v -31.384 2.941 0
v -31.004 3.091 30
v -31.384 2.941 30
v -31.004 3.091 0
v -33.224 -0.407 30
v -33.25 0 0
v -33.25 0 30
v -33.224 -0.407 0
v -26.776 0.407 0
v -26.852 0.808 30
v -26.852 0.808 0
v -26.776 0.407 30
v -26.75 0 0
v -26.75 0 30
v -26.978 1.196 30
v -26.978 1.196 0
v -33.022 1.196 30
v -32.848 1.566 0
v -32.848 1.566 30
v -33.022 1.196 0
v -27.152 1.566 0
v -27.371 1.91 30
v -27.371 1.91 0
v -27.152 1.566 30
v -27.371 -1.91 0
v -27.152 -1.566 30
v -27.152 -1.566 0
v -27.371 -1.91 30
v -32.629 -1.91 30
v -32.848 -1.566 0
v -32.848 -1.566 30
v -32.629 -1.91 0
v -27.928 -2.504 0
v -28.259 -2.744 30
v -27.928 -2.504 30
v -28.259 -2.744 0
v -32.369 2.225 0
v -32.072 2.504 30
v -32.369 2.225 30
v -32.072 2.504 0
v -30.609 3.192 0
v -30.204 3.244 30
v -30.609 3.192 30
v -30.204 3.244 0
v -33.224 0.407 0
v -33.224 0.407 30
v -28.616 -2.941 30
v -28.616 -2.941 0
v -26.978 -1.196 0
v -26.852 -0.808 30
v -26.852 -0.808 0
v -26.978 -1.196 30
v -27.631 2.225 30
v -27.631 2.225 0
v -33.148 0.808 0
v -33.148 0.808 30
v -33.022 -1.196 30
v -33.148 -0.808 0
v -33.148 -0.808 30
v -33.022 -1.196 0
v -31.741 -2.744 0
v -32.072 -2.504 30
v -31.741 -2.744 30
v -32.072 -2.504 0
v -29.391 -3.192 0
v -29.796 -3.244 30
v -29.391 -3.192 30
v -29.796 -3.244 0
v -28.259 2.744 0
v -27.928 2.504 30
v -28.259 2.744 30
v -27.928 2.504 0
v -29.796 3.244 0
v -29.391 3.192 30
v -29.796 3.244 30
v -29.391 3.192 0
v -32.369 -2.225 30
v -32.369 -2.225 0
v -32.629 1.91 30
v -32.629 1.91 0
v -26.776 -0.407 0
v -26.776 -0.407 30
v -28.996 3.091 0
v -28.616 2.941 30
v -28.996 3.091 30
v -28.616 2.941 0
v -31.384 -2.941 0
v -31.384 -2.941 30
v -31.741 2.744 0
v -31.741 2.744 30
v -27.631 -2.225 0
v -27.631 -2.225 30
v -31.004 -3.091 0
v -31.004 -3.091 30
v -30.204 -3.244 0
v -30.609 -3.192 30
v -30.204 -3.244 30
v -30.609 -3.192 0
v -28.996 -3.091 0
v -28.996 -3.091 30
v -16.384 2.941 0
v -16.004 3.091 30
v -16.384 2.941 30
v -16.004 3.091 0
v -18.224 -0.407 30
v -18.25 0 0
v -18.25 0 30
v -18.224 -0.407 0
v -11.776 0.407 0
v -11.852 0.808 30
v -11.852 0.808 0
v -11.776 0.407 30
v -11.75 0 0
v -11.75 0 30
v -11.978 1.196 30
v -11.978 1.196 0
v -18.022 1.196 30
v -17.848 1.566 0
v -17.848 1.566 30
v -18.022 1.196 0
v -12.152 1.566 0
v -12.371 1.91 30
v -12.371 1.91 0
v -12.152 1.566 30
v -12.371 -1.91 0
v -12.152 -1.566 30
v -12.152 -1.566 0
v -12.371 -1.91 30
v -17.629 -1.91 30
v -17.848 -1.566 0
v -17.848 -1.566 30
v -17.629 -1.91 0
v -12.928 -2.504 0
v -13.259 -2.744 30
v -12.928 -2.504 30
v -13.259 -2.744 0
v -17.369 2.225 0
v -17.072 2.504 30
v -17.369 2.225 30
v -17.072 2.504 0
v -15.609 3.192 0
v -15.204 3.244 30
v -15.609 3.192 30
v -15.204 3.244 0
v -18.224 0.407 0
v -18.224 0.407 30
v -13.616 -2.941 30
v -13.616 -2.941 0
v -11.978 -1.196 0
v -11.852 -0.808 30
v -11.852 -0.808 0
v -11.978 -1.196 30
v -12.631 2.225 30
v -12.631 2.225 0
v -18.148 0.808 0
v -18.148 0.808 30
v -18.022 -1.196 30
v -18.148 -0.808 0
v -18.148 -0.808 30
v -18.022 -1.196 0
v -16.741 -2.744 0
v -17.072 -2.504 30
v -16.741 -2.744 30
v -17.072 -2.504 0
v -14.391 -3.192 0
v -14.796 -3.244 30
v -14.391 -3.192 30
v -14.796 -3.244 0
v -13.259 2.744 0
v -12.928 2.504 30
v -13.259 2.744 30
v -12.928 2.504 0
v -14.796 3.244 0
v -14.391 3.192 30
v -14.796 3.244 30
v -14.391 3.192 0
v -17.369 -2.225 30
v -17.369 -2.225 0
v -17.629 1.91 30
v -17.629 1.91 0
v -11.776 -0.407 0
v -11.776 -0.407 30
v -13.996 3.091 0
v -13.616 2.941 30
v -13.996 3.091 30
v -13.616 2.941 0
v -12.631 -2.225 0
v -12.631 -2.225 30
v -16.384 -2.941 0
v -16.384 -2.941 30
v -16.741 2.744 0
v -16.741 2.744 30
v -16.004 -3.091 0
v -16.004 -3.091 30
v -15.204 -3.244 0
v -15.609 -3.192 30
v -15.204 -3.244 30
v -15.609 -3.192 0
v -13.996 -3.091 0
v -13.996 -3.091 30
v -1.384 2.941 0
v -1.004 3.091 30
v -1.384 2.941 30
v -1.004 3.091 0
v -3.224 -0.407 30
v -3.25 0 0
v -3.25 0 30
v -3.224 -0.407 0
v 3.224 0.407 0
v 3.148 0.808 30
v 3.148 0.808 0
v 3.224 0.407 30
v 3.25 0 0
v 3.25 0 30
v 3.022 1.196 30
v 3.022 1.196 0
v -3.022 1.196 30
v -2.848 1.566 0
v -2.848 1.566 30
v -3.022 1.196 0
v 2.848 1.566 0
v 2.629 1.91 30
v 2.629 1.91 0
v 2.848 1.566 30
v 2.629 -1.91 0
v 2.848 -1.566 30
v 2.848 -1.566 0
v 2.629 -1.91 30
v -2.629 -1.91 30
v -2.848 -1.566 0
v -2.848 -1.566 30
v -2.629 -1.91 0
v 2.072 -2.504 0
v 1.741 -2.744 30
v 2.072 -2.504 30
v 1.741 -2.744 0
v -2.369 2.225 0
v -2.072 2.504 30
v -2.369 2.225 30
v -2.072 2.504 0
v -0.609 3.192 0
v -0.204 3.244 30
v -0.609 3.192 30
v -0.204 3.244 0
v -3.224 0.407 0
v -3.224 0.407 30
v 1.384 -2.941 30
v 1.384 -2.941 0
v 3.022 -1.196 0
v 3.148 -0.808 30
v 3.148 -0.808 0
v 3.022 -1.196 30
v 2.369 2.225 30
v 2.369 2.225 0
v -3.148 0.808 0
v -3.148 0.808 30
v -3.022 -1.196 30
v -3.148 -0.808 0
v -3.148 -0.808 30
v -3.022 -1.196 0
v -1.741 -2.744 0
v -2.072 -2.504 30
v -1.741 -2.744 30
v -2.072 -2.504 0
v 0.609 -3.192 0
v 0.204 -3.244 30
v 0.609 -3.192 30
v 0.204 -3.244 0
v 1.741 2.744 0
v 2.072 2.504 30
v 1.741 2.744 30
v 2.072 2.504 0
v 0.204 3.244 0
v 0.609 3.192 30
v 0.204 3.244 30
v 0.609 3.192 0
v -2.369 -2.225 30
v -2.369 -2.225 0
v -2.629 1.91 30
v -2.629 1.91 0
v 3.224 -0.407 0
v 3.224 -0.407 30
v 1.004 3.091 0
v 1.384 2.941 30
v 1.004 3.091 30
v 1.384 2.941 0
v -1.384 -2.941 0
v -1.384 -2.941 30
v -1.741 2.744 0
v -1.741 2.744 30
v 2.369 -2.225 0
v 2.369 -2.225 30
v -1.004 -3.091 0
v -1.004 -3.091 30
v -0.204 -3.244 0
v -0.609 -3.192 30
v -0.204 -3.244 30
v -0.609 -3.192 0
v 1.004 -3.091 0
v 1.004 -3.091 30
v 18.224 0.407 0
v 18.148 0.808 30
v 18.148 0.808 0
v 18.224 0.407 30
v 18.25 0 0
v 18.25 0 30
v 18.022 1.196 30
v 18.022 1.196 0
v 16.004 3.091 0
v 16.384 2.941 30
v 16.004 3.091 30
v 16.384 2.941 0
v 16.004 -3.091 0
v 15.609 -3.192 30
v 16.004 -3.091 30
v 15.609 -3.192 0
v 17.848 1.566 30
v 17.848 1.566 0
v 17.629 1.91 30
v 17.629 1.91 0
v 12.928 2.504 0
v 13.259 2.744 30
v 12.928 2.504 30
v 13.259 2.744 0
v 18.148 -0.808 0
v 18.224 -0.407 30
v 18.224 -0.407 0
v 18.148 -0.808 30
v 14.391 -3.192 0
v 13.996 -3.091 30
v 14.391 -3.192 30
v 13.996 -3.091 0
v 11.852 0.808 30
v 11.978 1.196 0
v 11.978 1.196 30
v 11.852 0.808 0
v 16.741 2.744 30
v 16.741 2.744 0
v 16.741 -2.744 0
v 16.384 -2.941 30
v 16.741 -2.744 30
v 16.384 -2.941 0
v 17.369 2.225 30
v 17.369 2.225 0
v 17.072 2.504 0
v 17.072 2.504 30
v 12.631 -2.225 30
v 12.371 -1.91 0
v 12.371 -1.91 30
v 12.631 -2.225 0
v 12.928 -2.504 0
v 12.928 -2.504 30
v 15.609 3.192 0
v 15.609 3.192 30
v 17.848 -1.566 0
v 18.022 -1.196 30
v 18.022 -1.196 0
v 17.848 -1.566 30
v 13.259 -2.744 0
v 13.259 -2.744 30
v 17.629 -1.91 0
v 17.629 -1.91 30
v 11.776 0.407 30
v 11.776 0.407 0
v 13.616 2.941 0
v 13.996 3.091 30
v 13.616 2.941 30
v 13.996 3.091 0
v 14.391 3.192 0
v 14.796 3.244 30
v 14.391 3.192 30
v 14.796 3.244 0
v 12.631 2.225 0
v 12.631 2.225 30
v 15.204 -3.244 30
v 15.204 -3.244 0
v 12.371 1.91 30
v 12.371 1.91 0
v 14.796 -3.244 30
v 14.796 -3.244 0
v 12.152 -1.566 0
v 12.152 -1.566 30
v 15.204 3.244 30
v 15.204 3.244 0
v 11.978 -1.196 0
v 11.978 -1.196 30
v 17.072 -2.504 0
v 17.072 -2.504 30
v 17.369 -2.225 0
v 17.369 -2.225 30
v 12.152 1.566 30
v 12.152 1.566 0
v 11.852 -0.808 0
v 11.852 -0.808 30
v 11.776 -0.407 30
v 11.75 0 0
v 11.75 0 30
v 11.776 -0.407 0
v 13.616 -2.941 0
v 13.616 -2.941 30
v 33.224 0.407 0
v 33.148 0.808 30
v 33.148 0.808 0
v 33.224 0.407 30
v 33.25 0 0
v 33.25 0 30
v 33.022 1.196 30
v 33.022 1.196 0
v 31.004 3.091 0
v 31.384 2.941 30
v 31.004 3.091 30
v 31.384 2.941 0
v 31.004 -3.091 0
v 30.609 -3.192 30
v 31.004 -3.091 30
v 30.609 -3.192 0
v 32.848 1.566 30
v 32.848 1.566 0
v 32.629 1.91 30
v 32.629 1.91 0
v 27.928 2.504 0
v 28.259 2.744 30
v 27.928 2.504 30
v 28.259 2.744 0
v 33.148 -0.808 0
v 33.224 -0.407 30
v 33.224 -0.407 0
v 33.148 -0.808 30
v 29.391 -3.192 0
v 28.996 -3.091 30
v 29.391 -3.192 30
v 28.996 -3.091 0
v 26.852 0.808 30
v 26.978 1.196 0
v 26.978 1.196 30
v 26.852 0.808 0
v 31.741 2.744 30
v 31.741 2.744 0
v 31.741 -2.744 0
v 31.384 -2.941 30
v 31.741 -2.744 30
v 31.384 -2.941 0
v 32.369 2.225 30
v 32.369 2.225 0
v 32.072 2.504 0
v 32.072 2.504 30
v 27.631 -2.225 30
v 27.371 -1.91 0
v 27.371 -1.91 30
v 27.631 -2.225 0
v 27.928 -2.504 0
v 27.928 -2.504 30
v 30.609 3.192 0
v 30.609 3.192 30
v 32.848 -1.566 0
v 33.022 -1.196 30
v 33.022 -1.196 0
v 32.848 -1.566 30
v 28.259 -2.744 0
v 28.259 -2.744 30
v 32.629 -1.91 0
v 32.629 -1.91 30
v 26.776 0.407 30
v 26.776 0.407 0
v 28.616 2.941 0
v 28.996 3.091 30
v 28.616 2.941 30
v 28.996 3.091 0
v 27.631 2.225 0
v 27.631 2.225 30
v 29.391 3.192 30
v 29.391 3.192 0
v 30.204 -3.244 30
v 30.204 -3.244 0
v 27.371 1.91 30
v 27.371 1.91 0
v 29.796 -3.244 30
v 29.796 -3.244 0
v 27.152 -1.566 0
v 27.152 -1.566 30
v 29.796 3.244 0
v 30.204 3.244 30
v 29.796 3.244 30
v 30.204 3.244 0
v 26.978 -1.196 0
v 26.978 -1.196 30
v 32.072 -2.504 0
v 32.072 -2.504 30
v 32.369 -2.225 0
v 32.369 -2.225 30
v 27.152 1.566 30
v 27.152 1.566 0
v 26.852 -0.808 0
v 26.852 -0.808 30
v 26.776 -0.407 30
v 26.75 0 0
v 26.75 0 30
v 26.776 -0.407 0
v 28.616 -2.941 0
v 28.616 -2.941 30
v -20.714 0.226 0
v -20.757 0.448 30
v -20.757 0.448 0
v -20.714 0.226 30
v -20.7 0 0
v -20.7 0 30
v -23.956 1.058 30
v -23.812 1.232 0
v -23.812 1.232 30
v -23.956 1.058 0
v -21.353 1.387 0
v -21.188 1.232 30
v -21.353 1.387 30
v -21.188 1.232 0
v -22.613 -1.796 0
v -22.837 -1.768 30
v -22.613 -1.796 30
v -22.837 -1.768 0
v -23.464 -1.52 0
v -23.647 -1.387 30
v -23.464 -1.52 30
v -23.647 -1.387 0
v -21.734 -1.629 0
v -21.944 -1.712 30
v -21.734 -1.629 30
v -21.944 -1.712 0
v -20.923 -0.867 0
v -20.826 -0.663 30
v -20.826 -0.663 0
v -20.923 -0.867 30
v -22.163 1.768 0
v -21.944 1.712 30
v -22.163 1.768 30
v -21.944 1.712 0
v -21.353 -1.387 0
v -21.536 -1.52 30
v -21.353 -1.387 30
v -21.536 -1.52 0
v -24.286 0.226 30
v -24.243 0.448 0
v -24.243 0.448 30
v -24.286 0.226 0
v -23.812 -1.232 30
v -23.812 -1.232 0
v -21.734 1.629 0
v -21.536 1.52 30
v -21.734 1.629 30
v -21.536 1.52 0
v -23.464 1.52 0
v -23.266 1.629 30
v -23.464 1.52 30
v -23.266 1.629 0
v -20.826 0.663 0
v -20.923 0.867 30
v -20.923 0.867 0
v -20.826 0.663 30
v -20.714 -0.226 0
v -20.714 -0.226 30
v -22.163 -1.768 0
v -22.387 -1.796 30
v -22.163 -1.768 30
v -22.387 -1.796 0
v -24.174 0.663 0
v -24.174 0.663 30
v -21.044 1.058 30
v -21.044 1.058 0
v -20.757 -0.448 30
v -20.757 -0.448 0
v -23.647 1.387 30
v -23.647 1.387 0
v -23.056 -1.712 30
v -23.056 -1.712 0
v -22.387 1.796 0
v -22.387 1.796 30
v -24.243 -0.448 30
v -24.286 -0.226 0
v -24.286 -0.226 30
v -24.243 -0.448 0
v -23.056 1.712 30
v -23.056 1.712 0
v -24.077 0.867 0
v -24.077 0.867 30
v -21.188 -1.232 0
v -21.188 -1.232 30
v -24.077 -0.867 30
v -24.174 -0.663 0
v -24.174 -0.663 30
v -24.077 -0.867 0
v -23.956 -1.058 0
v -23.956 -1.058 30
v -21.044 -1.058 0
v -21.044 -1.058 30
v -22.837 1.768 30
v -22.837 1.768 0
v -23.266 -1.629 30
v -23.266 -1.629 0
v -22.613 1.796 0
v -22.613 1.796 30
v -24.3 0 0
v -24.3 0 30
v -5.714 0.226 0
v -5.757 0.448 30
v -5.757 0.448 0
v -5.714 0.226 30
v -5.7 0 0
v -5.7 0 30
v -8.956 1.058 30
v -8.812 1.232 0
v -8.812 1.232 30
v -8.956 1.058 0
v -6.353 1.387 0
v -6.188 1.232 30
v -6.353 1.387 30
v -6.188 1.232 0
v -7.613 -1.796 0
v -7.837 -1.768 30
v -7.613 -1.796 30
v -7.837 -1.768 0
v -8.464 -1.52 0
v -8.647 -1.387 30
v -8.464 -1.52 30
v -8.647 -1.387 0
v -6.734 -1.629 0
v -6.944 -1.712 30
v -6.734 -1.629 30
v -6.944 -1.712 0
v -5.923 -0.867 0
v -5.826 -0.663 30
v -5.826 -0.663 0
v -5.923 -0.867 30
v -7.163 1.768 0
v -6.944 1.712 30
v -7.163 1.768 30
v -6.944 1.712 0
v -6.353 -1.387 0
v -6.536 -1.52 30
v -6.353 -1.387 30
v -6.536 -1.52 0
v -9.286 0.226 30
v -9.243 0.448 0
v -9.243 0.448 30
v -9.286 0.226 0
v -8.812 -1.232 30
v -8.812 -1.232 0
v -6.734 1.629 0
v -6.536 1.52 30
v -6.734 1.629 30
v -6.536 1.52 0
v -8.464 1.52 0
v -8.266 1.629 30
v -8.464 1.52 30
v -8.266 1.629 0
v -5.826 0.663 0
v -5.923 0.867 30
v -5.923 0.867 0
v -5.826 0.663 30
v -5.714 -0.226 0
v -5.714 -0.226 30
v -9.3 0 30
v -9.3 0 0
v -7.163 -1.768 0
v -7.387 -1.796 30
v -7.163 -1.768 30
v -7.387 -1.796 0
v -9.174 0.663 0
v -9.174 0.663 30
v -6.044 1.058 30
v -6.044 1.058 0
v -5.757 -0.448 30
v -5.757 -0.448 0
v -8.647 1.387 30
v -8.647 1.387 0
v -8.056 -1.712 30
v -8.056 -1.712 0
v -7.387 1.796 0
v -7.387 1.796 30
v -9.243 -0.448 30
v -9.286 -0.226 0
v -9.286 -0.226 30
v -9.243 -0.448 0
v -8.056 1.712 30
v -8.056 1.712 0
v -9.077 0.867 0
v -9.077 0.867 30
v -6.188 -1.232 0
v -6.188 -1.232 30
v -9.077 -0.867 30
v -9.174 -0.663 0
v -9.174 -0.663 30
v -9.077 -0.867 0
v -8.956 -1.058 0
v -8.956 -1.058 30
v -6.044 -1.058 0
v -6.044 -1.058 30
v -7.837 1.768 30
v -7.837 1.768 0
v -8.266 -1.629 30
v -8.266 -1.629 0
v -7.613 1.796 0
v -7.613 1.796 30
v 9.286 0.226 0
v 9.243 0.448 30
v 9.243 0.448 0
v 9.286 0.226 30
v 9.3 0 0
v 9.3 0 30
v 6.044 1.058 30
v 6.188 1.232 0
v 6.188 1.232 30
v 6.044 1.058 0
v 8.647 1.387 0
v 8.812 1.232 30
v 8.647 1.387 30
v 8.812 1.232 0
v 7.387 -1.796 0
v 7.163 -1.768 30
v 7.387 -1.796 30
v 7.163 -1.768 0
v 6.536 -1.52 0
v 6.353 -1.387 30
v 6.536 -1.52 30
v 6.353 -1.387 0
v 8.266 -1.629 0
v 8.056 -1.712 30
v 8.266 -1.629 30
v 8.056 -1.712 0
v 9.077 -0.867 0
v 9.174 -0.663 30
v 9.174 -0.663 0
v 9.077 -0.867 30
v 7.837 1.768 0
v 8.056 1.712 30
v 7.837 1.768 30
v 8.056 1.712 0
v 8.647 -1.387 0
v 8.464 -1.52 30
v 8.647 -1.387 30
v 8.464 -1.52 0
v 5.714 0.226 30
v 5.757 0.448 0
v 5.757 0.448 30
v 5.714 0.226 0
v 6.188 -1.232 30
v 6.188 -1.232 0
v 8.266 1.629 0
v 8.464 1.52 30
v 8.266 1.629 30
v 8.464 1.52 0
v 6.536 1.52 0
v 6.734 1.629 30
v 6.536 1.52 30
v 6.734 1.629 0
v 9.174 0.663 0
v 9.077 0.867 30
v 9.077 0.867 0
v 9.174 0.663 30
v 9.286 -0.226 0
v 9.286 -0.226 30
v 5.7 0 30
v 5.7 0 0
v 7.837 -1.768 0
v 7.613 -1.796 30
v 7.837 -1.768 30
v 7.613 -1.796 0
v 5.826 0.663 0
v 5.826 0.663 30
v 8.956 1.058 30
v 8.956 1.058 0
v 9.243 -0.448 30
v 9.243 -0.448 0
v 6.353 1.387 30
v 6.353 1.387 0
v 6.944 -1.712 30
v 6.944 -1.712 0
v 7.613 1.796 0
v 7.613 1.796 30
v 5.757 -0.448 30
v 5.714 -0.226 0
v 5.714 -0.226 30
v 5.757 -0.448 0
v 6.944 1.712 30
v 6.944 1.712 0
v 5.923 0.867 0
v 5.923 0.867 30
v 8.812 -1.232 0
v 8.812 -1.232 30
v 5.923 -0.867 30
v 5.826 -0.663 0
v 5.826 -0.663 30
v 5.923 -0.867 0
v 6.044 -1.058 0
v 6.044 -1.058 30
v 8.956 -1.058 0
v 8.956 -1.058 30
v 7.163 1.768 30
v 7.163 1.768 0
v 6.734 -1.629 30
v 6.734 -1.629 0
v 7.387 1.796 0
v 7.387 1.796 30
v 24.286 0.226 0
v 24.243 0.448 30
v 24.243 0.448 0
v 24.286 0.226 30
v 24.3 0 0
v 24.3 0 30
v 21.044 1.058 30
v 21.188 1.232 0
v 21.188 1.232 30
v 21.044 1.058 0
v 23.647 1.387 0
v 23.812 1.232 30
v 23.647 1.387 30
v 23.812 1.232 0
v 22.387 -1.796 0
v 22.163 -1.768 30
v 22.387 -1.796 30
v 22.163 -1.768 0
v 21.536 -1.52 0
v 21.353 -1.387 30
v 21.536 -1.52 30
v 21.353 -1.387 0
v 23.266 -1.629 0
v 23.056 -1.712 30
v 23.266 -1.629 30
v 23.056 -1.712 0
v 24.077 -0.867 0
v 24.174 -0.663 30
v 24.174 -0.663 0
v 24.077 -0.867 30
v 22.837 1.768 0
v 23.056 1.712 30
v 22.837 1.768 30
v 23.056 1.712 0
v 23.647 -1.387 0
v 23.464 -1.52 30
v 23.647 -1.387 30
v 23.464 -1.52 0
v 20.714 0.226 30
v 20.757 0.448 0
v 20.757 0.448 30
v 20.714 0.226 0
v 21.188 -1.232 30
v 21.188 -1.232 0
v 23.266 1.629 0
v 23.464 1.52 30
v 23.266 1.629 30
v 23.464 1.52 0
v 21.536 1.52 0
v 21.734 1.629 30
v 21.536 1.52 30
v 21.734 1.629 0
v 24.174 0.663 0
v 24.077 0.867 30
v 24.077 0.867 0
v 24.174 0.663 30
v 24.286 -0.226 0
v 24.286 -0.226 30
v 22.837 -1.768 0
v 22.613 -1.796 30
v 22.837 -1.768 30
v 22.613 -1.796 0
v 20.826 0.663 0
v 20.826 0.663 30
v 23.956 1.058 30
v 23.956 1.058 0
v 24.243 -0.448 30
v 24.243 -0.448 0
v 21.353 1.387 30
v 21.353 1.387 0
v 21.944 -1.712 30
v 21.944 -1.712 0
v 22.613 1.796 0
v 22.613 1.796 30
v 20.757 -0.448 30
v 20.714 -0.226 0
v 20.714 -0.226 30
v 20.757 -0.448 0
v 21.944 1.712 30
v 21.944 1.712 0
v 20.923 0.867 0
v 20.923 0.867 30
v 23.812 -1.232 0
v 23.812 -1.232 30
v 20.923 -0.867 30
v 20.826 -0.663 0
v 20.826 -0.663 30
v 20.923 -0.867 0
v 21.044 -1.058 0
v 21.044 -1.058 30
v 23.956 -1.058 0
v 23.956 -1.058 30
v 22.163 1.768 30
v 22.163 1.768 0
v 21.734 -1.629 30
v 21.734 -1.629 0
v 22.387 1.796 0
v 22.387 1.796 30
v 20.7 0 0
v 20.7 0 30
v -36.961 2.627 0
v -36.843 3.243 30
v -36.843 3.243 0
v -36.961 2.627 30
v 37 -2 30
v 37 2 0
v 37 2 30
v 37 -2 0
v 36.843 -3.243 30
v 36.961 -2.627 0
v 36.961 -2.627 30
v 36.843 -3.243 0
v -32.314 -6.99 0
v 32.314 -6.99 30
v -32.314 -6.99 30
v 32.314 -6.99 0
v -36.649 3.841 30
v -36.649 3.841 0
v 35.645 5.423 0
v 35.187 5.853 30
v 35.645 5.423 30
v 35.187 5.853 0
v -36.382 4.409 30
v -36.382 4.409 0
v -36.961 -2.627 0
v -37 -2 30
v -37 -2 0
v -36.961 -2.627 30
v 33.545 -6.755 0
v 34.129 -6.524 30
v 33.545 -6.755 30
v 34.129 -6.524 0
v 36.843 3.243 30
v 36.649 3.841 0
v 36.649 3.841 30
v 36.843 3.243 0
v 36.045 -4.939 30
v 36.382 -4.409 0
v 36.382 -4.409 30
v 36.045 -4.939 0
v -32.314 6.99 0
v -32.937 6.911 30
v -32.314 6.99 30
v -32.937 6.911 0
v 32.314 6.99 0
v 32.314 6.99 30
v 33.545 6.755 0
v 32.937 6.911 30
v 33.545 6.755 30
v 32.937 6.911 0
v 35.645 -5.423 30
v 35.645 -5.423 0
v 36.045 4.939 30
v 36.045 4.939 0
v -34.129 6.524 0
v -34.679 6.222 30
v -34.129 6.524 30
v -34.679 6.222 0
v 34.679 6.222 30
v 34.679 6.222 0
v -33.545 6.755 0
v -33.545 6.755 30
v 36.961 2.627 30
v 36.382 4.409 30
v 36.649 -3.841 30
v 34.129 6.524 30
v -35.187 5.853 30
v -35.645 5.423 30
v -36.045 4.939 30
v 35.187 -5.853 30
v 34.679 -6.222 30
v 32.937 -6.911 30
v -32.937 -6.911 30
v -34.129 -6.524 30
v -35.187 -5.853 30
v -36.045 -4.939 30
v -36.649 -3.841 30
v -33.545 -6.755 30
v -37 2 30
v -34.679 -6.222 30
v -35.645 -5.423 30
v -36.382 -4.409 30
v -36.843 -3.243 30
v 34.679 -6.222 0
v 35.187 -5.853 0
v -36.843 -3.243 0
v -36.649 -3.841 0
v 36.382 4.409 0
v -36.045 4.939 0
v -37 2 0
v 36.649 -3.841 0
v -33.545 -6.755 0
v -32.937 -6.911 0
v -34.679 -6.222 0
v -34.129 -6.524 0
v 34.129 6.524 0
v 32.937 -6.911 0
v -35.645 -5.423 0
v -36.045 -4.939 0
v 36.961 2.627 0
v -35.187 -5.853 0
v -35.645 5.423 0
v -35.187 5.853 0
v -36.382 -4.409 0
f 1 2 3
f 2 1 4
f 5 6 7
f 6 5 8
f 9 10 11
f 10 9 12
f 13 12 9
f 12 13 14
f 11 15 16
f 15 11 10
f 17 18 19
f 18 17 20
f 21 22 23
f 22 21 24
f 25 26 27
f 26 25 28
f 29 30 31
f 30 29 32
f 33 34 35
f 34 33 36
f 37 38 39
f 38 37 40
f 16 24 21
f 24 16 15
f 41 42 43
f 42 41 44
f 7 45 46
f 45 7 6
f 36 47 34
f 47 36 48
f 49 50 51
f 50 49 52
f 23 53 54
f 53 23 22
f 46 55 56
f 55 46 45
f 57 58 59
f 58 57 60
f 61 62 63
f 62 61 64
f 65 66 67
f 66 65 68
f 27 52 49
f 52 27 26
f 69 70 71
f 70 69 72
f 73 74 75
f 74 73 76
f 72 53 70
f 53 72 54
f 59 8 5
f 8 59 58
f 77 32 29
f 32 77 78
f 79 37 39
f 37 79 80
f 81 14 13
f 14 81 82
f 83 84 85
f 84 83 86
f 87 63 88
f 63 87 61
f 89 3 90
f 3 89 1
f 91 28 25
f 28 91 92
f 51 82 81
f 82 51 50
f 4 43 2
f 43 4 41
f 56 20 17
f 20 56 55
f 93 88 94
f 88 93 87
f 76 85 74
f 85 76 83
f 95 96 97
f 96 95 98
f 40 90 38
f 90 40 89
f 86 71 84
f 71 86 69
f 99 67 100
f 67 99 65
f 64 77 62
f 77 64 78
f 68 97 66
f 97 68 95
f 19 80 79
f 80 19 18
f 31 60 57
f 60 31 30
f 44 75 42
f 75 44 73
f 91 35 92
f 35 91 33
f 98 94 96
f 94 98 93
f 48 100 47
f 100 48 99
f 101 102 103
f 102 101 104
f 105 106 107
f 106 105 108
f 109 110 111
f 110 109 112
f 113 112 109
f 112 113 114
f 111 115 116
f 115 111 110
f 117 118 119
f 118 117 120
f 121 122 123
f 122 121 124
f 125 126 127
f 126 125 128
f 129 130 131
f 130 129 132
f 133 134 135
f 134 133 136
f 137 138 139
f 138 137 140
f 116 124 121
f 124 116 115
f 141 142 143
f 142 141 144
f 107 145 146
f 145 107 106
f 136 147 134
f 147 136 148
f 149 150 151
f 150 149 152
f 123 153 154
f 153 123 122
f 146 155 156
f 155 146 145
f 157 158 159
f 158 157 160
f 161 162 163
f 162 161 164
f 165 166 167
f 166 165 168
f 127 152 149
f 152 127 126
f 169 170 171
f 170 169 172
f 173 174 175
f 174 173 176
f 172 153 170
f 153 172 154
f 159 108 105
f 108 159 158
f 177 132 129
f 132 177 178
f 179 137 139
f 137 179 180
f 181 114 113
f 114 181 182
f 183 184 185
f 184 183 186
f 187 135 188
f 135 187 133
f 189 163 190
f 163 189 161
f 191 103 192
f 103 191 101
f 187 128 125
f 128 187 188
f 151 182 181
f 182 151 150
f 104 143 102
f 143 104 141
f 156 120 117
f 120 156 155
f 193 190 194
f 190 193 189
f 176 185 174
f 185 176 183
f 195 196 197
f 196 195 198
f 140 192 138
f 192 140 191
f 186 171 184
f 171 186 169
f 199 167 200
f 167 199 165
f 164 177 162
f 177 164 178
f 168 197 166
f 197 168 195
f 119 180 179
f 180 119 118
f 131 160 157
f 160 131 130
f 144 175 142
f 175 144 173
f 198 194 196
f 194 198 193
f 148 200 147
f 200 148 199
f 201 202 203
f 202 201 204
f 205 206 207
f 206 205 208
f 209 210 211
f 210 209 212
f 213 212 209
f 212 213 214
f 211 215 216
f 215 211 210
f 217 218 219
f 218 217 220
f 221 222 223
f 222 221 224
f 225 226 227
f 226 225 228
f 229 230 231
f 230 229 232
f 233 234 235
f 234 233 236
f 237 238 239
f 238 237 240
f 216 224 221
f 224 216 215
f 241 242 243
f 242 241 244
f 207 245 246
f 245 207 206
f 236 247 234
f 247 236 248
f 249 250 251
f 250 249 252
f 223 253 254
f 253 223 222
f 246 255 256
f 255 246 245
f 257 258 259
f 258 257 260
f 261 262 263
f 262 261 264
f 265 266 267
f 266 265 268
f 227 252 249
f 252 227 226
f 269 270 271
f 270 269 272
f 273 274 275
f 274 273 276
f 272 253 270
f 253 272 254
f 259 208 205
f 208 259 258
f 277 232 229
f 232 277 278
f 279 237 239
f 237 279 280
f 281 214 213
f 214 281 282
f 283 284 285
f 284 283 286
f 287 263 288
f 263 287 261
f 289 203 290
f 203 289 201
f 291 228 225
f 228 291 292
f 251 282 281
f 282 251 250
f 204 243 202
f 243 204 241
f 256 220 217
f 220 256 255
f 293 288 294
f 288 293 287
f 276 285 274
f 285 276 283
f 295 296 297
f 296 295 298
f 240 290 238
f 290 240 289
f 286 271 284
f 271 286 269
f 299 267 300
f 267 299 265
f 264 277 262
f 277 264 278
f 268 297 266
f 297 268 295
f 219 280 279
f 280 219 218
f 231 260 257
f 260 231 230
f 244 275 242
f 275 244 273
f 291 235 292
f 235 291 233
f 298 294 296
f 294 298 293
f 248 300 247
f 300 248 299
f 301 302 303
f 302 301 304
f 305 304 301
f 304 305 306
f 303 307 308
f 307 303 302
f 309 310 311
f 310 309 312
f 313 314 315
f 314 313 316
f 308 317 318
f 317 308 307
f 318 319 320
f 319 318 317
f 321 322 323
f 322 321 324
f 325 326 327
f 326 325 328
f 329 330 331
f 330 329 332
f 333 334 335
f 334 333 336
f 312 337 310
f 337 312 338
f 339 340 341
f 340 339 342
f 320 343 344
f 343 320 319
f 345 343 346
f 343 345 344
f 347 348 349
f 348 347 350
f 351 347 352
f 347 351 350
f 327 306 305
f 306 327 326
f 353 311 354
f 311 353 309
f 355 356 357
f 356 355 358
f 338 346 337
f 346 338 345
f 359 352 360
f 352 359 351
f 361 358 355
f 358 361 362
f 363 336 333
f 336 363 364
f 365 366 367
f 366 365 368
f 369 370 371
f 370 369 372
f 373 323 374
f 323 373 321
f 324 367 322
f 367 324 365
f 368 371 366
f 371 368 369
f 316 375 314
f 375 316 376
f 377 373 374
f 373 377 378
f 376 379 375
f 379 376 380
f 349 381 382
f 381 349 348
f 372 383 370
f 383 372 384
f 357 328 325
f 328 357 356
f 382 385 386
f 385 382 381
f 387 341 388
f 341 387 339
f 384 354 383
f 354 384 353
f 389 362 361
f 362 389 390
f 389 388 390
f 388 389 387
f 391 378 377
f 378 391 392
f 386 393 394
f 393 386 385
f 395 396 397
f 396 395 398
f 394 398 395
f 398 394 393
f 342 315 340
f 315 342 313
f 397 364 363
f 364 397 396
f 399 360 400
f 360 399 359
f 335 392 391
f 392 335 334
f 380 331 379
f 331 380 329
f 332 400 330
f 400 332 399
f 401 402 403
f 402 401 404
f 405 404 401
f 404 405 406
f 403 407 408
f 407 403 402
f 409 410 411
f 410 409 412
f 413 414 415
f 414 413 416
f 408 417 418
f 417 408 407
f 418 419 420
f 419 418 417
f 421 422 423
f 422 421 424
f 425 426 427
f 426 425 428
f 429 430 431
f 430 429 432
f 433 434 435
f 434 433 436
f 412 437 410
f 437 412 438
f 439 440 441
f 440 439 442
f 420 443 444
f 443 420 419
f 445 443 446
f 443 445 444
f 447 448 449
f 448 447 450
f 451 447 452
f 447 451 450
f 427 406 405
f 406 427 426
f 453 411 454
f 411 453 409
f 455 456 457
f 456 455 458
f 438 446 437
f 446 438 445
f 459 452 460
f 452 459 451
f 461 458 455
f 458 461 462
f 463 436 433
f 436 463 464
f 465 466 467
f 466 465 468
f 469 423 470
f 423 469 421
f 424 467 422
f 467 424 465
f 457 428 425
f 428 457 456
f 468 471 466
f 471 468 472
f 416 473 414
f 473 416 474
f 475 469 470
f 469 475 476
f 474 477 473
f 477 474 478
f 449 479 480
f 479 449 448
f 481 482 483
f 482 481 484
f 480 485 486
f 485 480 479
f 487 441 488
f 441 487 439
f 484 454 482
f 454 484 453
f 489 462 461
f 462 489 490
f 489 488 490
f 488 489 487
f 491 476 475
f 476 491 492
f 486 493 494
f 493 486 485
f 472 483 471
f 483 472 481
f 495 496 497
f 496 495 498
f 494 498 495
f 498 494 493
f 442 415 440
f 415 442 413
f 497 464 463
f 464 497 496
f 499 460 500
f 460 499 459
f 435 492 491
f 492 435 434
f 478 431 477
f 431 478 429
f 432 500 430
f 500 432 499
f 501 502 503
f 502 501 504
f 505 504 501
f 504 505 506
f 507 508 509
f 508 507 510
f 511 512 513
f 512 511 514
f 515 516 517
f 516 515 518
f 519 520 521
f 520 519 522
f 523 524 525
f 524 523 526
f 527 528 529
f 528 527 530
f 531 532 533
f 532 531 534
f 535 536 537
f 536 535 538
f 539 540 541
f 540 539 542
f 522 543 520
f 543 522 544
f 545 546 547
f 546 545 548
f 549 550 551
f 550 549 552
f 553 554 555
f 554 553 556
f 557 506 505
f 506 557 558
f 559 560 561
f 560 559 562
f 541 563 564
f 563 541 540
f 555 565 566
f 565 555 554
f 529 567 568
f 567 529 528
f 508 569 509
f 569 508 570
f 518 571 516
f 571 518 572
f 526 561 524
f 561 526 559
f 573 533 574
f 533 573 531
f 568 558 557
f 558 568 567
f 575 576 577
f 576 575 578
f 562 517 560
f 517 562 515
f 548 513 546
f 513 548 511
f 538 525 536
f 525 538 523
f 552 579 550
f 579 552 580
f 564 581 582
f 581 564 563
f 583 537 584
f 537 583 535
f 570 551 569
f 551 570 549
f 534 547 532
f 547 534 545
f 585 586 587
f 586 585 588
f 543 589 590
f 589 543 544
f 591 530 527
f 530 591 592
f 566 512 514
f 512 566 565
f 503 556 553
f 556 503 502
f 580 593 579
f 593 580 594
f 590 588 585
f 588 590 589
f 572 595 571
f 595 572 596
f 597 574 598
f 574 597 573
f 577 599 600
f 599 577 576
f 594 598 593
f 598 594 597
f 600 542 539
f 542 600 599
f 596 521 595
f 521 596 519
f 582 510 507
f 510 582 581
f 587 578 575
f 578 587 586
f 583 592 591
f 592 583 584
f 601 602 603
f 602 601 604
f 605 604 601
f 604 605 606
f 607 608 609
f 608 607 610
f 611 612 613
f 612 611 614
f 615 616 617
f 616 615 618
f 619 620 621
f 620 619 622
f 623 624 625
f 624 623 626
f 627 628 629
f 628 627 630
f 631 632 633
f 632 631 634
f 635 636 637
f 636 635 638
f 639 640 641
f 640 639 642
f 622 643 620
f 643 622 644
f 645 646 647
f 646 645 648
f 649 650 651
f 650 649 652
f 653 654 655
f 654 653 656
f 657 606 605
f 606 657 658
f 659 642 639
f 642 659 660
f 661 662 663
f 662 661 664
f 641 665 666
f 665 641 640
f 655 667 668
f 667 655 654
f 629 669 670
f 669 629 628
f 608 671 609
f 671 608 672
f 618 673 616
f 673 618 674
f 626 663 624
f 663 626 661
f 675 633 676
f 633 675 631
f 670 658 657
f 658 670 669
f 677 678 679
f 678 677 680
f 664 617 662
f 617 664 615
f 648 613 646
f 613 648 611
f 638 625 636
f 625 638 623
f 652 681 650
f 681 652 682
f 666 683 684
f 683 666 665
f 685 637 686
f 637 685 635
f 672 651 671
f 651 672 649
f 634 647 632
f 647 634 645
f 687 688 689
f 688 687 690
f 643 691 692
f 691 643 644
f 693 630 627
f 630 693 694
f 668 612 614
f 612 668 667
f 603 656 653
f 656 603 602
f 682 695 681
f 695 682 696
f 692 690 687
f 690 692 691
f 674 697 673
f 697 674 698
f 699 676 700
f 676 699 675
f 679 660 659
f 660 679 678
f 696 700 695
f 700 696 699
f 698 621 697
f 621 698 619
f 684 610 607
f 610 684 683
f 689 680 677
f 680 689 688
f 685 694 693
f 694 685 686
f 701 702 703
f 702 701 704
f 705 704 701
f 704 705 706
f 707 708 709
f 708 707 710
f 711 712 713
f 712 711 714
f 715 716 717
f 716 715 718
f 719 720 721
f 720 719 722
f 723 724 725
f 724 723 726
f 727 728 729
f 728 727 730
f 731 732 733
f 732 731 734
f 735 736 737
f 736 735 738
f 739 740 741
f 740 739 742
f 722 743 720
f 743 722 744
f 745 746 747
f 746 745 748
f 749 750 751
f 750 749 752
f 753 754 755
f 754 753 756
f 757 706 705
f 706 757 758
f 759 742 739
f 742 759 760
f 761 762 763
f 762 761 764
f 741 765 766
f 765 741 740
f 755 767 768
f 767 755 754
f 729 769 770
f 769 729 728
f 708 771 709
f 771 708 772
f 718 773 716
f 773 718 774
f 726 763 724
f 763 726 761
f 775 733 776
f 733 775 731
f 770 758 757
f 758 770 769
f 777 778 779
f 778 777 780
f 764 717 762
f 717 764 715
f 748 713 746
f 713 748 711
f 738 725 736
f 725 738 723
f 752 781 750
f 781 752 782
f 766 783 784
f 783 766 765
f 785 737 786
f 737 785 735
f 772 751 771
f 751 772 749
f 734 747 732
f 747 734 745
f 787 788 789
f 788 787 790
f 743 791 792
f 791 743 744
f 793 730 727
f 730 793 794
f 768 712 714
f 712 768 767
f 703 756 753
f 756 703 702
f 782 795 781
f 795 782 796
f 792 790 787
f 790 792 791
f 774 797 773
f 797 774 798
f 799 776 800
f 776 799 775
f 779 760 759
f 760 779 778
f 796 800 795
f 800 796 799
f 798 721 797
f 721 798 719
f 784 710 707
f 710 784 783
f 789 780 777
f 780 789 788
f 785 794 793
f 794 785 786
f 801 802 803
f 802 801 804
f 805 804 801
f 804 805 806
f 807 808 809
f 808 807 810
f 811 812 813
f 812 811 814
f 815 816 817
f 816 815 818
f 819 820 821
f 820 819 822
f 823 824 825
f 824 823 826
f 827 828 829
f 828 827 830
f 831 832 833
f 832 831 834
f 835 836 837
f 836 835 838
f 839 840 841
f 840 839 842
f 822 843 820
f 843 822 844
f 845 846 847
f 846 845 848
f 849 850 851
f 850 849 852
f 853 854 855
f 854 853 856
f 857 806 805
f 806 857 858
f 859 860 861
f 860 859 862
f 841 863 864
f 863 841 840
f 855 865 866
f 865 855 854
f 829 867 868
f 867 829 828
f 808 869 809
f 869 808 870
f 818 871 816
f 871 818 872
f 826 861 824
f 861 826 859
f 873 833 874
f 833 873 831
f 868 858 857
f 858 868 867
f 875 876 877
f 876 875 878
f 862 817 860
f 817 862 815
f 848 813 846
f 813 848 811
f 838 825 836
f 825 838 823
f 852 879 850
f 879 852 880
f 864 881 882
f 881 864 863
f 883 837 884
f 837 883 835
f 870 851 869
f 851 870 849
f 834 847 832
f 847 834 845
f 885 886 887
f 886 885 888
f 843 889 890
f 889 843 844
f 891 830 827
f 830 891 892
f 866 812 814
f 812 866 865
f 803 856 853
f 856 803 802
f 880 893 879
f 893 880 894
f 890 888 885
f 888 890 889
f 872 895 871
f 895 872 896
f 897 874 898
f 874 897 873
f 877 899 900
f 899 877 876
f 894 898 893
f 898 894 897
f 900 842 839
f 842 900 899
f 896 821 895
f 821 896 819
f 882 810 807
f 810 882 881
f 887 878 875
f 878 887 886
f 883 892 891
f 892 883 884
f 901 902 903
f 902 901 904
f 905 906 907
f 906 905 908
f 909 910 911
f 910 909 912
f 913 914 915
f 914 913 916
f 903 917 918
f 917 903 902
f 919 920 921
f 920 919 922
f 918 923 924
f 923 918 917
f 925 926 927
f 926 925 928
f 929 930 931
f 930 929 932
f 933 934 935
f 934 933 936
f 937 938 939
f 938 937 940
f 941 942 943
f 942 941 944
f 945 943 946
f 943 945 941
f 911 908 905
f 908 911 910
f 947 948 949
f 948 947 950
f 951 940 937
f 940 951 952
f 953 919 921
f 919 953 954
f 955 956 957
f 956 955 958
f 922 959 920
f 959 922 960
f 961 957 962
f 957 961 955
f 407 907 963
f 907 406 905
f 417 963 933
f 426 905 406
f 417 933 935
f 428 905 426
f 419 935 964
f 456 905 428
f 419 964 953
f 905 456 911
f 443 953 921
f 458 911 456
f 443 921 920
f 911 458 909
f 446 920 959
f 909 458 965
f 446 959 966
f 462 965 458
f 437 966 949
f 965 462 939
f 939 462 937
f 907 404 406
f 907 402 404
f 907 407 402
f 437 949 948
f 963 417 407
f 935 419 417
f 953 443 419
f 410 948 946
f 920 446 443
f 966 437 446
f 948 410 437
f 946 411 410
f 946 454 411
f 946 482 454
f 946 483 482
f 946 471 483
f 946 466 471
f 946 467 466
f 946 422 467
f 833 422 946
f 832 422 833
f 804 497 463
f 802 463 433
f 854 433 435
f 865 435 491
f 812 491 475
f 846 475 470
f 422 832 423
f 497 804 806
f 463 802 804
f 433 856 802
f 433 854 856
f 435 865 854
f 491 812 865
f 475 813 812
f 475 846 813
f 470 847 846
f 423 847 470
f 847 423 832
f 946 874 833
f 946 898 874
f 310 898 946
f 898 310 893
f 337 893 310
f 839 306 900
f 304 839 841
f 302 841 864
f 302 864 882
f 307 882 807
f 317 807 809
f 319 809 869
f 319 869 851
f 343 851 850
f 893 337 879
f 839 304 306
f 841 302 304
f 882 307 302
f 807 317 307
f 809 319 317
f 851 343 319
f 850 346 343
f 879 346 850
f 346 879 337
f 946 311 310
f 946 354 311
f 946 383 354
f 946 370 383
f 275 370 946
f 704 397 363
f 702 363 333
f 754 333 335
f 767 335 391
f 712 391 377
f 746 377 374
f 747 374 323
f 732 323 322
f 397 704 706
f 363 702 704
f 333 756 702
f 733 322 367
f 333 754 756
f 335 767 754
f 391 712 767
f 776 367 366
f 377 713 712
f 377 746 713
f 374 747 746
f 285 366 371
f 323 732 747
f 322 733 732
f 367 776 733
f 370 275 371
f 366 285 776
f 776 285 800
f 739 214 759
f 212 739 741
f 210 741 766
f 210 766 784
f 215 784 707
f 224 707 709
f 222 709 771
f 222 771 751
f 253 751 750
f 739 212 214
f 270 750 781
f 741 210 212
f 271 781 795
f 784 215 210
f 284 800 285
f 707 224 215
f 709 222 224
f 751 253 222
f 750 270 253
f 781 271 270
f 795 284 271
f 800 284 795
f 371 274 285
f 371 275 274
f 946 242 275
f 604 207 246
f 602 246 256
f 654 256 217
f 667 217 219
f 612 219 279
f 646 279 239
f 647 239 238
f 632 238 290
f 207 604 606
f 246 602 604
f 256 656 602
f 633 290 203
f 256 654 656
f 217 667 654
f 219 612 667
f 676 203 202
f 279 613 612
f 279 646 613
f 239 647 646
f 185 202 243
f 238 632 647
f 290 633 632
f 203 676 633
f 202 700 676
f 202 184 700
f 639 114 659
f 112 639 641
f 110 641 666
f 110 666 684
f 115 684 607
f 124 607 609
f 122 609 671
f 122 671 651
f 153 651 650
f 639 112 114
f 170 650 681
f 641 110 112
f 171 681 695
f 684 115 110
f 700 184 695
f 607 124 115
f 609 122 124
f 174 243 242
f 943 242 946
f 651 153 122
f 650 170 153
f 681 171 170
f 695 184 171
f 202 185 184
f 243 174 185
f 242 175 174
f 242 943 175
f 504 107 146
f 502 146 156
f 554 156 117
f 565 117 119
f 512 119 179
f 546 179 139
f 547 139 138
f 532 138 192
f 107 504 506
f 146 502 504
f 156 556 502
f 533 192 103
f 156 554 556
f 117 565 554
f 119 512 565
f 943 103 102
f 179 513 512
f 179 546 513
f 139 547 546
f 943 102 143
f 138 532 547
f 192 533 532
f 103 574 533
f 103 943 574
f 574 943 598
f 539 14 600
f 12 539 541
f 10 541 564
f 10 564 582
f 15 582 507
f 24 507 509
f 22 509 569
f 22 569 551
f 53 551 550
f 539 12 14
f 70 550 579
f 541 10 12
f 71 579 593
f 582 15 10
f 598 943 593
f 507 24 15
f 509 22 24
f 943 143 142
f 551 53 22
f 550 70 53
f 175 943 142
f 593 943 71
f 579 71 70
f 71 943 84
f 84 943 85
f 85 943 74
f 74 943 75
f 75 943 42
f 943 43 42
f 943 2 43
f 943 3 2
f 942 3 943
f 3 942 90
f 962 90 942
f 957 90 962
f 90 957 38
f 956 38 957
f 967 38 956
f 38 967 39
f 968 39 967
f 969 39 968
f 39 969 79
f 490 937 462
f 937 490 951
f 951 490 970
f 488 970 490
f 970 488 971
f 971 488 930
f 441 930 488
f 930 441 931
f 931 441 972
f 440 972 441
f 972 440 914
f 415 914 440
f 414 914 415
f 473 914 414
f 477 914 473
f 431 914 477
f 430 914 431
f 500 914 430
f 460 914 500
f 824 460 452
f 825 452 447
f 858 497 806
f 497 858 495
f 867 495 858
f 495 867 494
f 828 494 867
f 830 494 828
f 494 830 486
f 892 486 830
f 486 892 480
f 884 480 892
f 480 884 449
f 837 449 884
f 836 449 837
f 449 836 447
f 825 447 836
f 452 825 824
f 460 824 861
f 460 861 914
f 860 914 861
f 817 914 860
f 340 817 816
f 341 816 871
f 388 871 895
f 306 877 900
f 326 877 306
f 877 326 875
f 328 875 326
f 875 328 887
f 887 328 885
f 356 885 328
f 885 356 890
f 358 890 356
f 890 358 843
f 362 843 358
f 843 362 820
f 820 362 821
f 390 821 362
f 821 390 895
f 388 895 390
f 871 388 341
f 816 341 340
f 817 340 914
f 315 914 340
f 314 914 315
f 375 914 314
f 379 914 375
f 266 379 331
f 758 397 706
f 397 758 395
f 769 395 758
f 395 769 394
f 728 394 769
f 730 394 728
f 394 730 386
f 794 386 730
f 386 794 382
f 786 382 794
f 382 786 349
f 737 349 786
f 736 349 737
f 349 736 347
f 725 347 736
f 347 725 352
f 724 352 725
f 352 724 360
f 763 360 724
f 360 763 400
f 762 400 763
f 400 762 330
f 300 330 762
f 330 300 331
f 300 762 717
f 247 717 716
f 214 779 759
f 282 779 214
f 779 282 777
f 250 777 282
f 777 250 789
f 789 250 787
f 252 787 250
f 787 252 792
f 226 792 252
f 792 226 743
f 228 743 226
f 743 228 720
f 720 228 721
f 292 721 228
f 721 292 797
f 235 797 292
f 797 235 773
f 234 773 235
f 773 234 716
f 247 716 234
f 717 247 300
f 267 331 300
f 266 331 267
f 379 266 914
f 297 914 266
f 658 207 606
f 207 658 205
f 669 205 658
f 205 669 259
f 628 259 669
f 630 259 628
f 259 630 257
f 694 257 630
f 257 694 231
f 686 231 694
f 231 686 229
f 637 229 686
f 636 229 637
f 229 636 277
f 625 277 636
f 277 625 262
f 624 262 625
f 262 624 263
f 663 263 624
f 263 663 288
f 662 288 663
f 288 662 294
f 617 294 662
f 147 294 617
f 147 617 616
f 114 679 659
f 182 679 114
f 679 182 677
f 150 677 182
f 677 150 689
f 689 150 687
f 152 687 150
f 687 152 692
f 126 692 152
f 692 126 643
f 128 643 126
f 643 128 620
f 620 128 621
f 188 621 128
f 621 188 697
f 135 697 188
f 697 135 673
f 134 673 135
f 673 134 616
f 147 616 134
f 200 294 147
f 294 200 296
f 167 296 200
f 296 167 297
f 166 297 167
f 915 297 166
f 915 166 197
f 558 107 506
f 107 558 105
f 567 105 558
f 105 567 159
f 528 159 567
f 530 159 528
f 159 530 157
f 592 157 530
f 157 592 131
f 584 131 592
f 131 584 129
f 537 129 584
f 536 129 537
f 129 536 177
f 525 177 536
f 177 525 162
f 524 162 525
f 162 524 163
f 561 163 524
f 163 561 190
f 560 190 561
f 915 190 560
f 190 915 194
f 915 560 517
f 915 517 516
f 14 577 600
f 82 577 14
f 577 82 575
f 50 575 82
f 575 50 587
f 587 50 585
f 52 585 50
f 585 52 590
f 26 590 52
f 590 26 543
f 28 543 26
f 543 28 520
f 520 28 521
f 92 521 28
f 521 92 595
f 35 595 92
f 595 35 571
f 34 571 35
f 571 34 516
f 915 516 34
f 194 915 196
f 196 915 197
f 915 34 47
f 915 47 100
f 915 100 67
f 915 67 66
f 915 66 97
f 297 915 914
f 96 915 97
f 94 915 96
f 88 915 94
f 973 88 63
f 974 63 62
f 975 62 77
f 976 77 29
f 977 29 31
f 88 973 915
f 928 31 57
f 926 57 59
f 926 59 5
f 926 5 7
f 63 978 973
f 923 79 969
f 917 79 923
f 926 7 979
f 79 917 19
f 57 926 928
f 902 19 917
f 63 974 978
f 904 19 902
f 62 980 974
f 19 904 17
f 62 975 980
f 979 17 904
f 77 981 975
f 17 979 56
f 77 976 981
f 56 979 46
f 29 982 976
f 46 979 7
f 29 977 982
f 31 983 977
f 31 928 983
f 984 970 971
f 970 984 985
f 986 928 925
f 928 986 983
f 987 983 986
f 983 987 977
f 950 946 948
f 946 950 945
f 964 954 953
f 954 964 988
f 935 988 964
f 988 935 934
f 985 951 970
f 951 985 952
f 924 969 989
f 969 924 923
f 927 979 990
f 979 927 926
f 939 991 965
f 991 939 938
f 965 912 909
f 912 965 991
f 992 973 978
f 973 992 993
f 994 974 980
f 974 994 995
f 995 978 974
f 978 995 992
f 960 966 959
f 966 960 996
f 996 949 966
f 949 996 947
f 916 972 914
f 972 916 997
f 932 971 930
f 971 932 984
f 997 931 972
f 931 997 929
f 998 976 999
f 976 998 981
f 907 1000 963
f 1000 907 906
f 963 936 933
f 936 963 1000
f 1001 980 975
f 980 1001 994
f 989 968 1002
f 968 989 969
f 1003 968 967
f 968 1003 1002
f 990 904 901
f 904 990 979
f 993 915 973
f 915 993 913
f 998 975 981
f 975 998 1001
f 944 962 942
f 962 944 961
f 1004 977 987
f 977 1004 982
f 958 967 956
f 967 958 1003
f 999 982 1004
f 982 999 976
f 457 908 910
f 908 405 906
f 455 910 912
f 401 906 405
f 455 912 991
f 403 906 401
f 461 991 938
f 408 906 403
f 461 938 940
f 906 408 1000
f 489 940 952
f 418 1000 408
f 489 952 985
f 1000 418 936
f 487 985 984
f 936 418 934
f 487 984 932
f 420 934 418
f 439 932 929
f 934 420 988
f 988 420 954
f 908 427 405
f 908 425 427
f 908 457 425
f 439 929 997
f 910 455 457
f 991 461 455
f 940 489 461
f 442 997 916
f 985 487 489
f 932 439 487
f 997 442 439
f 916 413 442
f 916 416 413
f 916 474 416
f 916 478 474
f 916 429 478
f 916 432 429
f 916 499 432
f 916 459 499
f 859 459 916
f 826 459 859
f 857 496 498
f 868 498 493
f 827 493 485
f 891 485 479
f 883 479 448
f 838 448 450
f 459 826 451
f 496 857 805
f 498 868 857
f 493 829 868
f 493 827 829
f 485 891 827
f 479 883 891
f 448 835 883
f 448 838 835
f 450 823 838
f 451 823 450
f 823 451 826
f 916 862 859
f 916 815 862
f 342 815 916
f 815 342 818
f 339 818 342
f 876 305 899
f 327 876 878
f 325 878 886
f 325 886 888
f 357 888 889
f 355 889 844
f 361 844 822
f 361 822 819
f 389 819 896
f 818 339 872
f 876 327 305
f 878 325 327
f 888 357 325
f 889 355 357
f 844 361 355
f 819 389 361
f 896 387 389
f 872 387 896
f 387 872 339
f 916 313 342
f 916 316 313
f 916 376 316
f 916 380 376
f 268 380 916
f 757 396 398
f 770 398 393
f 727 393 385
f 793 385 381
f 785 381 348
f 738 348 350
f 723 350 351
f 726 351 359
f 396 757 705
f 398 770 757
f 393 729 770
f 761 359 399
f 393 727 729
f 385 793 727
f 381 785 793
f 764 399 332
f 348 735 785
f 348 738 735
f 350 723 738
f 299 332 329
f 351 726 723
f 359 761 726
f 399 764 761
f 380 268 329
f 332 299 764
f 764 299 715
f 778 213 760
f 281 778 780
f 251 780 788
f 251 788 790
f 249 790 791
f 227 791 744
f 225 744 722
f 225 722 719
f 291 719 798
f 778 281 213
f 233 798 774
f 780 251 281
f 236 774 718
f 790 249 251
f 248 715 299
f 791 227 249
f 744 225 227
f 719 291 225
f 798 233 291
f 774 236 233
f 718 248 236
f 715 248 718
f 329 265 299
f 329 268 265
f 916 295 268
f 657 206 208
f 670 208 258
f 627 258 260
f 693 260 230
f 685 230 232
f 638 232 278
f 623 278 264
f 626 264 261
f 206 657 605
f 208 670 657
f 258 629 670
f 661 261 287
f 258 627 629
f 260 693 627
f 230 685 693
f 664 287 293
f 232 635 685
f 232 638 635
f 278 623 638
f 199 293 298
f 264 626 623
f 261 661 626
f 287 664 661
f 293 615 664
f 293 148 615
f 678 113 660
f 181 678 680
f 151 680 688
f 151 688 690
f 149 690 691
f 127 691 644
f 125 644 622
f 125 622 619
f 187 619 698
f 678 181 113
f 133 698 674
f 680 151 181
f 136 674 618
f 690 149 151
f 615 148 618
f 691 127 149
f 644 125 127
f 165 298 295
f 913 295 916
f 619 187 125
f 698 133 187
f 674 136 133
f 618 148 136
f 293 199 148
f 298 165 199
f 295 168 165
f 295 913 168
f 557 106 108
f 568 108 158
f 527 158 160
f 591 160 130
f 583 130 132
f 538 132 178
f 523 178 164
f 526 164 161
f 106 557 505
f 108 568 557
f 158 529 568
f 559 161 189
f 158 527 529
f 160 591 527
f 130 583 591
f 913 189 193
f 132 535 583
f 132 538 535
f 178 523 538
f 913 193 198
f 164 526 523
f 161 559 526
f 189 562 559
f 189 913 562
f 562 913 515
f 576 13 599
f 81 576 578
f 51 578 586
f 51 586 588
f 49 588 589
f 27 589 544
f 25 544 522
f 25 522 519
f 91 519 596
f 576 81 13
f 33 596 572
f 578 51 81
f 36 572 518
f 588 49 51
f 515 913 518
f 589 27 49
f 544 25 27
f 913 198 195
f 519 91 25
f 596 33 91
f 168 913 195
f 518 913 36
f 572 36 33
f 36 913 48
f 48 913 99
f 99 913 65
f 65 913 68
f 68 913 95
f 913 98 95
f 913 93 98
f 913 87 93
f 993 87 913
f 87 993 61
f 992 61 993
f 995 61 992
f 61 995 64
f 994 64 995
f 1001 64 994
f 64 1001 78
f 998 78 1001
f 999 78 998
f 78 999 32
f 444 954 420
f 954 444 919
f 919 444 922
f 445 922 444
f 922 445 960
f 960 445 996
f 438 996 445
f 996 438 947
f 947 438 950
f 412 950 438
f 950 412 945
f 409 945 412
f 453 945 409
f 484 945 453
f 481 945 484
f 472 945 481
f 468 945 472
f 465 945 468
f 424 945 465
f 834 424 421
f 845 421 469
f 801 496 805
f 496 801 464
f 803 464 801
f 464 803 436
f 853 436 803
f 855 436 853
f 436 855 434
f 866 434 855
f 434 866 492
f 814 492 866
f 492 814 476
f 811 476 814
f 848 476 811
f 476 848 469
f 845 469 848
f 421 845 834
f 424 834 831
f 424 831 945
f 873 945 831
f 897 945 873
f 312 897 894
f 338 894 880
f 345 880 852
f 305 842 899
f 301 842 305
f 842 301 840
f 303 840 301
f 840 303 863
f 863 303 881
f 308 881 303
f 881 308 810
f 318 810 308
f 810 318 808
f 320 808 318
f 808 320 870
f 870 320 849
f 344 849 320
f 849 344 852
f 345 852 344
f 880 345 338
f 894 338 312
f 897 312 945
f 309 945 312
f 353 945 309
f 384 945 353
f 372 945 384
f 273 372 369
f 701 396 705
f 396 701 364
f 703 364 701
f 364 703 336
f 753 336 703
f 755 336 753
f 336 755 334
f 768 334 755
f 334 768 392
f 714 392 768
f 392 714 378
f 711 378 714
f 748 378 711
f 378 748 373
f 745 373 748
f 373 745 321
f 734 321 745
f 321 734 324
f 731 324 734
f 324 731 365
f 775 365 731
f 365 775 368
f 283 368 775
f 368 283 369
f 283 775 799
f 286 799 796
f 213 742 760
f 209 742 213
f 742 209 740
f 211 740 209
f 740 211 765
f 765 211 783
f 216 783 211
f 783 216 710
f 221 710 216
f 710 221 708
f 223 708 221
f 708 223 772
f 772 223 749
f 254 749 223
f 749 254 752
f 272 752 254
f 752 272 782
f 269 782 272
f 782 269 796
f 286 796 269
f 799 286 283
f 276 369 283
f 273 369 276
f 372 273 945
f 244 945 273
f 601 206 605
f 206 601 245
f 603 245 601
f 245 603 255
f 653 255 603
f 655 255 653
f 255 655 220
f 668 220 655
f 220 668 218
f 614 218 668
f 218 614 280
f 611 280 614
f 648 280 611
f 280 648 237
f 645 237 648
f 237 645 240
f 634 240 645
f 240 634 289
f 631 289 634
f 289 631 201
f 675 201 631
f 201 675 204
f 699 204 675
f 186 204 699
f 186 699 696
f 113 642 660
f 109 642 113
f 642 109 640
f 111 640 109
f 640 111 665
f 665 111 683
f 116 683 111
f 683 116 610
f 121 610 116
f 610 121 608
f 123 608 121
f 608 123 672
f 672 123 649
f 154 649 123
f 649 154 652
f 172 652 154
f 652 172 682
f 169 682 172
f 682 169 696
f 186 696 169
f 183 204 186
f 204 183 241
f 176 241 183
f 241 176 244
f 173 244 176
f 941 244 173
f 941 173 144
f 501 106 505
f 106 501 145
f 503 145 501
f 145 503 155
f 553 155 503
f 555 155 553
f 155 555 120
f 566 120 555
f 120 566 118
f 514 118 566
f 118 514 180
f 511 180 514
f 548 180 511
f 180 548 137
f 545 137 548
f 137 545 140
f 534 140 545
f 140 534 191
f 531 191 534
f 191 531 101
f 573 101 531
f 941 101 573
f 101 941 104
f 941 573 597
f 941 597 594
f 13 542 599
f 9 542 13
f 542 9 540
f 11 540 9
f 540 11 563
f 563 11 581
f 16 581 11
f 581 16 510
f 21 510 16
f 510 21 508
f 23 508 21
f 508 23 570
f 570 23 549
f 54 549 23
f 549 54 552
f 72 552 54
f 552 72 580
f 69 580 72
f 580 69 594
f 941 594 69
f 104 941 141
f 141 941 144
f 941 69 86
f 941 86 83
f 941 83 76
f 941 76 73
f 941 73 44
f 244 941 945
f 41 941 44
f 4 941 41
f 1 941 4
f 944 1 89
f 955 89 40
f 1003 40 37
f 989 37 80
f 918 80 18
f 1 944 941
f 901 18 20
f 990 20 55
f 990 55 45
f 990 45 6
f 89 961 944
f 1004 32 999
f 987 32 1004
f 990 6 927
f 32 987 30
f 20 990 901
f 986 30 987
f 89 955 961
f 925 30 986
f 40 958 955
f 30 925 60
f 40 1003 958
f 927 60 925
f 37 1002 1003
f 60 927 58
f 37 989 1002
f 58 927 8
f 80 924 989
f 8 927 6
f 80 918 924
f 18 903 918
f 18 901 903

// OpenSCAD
$fn = 50;


difference() {
	union() {
		hull() {
			translate(v = [-32.0000000000, 2.0000000000, 0]) {
				cylinder(h = 30, r = 5);
			}
			translate(v = [32.0000000000, 2.0000000000, 0]) {
				cylinder(h = 30, r = 5);
			}
			translate(v = [-32.0000000000, -2.0000000000, 0]) {
				cylinder(h = 30, r = 5);
			}
			translate(v = [32.0000000000, -2.0000000000, 0]) {
				cylinder(h = 30, r = 5);
			}
		}
	}
	union() {
		translate(v = [-30.0000000000, 0.0000000000, 0]) {
			translate(v = [0, 0, -100]) {
				cylinder(h = 200, r = 3.2500000000);
			}
		}
		translate(v = [-15.0000000000, 0.0000000000, 0]) {
			translate(v = [0, 0, -100]) {
				cylinder(h = 200, r = 3.2500000000);
			}
		}
		translate(v = [0, 0, -100]) {
			cylinder(h = 200, r = 3.2500000000);
		}
		translate(v = [15.0000000000, 0.0000000000, 0]) {
			translate(v = [0, 0, -100]) {
				cylinder(h = 200, r = 3.2500000000);
			}
		}
		translate(v = [30.0000000000, 0.0000000000, 0]) {
			translate(v = [0, 0, -100]) {
				cylinder(h = 200, r = 3.2500000000);
			}
		}
		translate(v = [-30.0000000000, 0.0000000000, 0]) {
			translate(v = [0, 0, -100]) {
				cylinder(h = 200, r = 1.8000000000);
			}
		}
		translate(v = [-22.5000000000, 0.0000000000, 0]) {
			translate(v = [0, 0, -100]) {
				cylinder(h = 200, r = 1.8000000000);
			}
		}
		translate(v = [-15.0000000000, 0.0000000000, 0]) {
			translate(v = [0, 0, -100]) {
				cylinder(h = 200, r = 1.8000000000);
			}
		}
		translate(v = [-7.5000000000, 0.0000000000, 0]) {
			translate(v = [0, 0, -100]) {
				cylinder(h = 200, r = 1.8000000000);
			}
		}
		translate(v = [0, 0, -100]) {
			cylinder(h = 200, r = 1.8000000000);
		}
		translate(v = [7.5000000000, 0.0000000000, 0]) {
			translate(v = [0, 0, -100]) {
				cylinder(h = 200, r = 1.8000000000);
			}
		}
		translate(v = [15.0000000000, 0.0000000000, 0]) {
			translate(v = [0, 0, -100]) {
				cylinder(h = 200, r = 1.8000000000);
			}
		}
		translate(v = [22.5000000000, 0.0000000000, 0]) {
			translate(v = [0, 0, -100]) {
				cylinder(h = 200, r = 1.8000000000);
			}
		}
		translate(v = [30.0000000000, 0.0000000000, 0]) {
			translate(v = [0, 0, -100]) {
				cylinder(h = 200, r = 1.8000000000);
			}
		}
	}
}
